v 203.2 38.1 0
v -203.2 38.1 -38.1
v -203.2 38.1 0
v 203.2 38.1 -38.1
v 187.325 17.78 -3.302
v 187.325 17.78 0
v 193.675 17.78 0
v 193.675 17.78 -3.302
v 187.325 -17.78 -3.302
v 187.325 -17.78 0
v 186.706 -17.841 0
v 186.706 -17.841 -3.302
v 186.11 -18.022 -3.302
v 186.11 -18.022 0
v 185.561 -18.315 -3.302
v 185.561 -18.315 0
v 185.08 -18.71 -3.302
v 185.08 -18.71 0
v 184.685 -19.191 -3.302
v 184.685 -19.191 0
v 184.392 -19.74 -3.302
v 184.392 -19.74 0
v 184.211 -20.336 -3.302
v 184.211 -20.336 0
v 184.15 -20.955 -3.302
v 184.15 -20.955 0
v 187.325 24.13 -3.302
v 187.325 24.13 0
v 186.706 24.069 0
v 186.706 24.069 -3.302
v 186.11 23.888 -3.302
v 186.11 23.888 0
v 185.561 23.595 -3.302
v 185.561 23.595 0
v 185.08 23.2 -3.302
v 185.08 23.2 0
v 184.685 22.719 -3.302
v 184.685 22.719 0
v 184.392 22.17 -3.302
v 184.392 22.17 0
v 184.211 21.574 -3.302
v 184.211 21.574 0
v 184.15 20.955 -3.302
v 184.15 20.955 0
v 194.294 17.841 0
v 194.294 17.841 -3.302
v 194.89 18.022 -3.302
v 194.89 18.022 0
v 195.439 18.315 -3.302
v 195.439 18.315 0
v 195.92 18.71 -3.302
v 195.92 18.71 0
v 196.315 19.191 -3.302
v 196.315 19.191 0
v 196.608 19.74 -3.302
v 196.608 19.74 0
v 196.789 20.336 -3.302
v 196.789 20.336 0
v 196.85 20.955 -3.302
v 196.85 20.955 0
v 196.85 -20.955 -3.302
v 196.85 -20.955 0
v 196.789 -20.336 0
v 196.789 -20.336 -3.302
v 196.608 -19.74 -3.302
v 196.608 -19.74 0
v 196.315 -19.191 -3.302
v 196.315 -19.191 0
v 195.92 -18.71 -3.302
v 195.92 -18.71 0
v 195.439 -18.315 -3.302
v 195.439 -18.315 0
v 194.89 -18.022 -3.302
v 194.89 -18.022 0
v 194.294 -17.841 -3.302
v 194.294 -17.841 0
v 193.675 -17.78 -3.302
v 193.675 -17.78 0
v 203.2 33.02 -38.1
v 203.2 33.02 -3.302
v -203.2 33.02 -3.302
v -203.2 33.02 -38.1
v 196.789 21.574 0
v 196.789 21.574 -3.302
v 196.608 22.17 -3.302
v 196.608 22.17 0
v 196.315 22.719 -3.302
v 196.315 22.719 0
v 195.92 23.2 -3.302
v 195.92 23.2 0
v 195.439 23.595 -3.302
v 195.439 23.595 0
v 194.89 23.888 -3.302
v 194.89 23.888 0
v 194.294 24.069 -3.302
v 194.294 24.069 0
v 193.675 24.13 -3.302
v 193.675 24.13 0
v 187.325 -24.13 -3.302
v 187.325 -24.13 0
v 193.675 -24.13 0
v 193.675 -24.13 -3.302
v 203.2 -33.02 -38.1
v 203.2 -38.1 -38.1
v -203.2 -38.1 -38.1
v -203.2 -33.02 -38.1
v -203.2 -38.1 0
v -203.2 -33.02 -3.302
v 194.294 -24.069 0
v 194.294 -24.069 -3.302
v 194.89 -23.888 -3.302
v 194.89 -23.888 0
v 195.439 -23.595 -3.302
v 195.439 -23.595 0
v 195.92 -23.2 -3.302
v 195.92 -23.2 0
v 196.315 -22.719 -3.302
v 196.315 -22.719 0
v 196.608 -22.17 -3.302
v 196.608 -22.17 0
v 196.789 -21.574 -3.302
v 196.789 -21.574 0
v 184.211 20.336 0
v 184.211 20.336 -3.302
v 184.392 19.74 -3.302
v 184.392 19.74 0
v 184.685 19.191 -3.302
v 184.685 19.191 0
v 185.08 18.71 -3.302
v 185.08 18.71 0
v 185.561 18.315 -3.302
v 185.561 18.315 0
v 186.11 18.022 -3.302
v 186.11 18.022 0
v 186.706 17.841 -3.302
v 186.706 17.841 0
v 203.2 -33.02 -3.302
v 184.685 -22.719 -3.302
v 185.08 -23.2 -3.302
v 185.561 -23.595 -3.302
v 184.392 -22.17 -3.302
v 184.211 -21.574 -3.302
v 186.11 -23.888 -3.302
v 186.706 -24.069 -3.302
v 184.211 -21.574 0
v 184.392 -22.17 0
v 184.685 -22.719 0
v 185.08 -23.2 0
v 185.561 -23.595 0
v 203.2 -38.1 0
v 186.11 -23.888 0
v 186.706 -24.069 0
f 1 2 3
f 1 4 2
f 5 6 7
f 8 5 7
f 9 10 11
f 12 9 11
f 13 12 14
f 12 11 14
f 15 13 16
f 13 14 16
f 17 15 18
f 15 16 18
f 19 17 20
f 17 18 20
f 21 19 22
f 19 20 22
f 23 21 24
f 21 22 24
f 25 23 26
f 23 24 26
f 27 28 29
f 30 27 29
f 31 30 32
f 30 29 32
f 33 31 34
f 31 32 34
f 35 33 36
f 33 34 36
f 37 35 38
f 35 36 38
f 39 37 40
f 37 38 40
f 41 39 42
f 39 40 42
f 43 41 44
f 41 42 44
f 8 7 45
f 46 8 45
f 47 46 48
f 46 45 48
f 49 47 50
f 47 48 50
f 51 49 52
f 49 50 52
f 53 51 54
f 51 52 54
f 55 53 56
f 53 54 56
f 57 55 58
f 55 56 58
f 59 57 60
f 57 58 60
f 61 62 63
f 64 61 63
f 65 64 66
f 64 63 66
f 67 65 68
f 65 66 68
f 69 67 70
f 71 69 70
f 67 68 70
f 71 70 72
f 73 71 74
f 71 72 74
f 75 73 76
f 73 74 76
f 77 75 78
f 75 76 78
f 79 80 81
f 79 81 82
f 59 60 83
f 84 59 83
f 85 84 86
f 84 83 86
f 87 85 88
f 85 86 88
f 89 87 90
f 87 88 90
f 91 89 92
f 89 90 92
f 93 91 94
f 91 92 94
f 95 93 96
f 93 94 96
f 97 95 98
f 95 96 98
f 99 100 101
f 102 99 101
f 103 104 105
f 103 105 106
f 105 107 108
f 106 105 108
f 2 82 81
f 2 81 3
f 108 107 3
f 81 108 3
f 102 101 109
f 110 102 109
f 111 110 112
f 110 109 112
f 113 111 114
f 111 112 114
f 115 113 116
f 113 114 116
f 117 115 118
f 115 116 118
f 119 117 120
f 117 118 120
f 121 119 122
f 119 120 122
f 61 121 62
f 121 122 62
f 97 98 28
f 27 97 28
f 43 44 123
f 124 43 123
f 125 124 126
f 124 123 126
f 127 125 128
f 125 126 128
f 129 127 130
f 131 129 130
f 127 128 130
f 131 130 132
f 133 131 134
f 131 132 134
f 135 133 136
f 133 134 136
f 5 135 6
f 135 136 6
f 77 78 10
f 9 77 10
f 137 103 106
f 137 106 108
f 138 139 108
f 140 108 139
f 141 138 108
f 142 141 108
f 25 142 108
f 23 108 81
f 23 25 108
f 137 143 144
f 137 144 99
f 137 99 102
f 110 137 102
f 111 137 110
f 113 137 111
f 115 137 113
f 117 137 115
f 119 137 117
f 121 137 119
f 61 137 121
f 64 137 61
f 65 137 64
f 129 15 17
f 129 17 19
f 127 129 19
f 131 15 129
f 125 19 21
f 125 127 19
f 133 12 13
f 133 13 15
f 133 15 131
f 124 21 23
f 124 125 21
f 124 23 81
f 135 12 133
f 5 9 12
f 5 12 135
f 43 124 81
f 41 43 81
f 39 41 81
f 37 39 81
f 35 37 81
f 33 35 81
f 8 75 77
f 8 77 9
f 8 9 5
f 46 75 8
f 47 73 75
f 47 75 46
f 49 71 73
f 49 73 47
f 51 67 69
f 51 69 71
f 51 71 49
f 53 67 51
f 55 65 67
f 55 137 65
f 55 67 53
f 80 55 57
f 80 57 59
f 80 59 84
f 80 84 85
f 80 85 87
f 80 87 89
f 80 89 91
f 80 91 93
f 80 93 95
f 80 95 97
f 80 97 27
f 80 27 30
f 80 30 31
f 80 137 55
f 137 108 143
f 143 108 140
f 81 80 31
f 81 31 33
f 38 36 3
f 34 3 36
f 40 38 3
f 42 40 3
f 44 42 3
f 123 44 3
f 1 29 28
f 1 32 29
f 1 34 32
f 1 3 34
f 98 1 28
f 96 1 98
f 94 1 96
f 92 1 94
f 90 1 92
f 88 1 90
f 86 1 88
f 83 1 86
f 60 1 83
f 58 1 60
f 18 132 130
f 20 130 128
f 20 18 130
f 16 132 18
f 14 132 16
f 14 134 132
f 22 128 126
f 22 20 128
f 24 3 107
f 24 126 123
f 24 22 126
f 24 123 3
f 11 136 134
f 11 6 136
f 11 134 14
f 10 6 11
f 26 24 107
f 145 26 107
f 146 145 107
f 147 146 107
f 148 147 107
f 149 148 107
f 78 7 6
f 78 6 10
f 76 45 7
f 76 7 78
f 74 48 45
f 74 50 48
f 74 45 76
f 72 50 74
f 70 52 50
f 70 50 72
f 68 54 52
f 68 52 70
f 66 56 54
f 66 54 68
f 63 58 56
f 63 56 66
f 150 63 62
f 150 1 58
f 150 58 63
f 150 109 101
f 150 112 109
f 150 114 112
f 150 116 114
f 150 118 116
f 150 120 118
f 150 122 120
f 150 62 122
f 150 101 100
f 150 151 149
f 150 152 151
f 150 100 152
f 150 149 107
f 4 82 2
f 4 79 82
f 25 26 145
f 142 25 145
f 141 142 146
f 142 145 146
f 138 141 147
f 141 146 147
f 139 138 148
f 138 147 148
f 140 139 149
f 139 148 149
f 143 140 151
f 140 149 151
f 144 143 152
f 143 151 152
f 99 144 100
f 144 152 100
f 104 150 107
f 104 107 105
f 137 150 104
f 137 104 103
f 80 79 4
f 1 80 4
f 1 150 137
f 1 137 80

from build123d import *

# Parameters (mm, degrees)
F1_DEPTH = 203.2
F3_DEPTH = 3.302


with BuildPart() as f1:
    # F0 (on Right) → F1 (new body, symmetric)
    with BuildSketch(Plane.YZ):
        Polygon((38.1, 0), (-38.1, 0), (-38.1, -38.1), (-33.02, -38.1), (-33.02, -3.302), (33.02, -3.302), (33.02, -38.1), (38.1, -38.1), align=None)
    extrude(amount=F1_DEPTH, both=True)

    # F2 (on face) → F3 (cut, through all)
    with BuildSketch(Plane.XY):
        with BuildLine():
            Line((187.325, 17.78), (193.675, 17.78))
            ThreePointArc((193.675, 17.78), (195.920064, 18.709936), (196.85, 20.955))
            ThreePointArc((196.85, 20.955), (195.920064, 23.200064), (193.675, 24.13))
            Line((193.675, 24.13), (187.325, 24.13))
            ThreePointArc((187.325, 24.13), (185.079936, 23.200064), (184.15, 20.955))
            ThreePointArc((184.15, 20.955), (185.079936, 18.709936), (187.325, 17.78))
        make_face()
        with BuildLine():
            ThreePointArc((196.85, -20.955), (195.920064, -18.709936), (193.675, -17.78))
            Line((193.675, -17.78), (187.325, -17.78))
            ThreePointArc((187.325, -17.78), (185.079936, -18.709936), (184.15, -20.955))
            ThreePointArc((184.15, -20.955), (185.079936, -23.200064), (187.325, -24.13))
            Line((187.325, -24.13), (193.675, -24.13))
            ThreePointArc((193.675, -24.13), (195.920064, -23.200064), (196.85, -20.955))
        make_face()
    extrude(amount=-F3_DEPTH, mode=Mode.SUBTRACT)


solid = f1.part
